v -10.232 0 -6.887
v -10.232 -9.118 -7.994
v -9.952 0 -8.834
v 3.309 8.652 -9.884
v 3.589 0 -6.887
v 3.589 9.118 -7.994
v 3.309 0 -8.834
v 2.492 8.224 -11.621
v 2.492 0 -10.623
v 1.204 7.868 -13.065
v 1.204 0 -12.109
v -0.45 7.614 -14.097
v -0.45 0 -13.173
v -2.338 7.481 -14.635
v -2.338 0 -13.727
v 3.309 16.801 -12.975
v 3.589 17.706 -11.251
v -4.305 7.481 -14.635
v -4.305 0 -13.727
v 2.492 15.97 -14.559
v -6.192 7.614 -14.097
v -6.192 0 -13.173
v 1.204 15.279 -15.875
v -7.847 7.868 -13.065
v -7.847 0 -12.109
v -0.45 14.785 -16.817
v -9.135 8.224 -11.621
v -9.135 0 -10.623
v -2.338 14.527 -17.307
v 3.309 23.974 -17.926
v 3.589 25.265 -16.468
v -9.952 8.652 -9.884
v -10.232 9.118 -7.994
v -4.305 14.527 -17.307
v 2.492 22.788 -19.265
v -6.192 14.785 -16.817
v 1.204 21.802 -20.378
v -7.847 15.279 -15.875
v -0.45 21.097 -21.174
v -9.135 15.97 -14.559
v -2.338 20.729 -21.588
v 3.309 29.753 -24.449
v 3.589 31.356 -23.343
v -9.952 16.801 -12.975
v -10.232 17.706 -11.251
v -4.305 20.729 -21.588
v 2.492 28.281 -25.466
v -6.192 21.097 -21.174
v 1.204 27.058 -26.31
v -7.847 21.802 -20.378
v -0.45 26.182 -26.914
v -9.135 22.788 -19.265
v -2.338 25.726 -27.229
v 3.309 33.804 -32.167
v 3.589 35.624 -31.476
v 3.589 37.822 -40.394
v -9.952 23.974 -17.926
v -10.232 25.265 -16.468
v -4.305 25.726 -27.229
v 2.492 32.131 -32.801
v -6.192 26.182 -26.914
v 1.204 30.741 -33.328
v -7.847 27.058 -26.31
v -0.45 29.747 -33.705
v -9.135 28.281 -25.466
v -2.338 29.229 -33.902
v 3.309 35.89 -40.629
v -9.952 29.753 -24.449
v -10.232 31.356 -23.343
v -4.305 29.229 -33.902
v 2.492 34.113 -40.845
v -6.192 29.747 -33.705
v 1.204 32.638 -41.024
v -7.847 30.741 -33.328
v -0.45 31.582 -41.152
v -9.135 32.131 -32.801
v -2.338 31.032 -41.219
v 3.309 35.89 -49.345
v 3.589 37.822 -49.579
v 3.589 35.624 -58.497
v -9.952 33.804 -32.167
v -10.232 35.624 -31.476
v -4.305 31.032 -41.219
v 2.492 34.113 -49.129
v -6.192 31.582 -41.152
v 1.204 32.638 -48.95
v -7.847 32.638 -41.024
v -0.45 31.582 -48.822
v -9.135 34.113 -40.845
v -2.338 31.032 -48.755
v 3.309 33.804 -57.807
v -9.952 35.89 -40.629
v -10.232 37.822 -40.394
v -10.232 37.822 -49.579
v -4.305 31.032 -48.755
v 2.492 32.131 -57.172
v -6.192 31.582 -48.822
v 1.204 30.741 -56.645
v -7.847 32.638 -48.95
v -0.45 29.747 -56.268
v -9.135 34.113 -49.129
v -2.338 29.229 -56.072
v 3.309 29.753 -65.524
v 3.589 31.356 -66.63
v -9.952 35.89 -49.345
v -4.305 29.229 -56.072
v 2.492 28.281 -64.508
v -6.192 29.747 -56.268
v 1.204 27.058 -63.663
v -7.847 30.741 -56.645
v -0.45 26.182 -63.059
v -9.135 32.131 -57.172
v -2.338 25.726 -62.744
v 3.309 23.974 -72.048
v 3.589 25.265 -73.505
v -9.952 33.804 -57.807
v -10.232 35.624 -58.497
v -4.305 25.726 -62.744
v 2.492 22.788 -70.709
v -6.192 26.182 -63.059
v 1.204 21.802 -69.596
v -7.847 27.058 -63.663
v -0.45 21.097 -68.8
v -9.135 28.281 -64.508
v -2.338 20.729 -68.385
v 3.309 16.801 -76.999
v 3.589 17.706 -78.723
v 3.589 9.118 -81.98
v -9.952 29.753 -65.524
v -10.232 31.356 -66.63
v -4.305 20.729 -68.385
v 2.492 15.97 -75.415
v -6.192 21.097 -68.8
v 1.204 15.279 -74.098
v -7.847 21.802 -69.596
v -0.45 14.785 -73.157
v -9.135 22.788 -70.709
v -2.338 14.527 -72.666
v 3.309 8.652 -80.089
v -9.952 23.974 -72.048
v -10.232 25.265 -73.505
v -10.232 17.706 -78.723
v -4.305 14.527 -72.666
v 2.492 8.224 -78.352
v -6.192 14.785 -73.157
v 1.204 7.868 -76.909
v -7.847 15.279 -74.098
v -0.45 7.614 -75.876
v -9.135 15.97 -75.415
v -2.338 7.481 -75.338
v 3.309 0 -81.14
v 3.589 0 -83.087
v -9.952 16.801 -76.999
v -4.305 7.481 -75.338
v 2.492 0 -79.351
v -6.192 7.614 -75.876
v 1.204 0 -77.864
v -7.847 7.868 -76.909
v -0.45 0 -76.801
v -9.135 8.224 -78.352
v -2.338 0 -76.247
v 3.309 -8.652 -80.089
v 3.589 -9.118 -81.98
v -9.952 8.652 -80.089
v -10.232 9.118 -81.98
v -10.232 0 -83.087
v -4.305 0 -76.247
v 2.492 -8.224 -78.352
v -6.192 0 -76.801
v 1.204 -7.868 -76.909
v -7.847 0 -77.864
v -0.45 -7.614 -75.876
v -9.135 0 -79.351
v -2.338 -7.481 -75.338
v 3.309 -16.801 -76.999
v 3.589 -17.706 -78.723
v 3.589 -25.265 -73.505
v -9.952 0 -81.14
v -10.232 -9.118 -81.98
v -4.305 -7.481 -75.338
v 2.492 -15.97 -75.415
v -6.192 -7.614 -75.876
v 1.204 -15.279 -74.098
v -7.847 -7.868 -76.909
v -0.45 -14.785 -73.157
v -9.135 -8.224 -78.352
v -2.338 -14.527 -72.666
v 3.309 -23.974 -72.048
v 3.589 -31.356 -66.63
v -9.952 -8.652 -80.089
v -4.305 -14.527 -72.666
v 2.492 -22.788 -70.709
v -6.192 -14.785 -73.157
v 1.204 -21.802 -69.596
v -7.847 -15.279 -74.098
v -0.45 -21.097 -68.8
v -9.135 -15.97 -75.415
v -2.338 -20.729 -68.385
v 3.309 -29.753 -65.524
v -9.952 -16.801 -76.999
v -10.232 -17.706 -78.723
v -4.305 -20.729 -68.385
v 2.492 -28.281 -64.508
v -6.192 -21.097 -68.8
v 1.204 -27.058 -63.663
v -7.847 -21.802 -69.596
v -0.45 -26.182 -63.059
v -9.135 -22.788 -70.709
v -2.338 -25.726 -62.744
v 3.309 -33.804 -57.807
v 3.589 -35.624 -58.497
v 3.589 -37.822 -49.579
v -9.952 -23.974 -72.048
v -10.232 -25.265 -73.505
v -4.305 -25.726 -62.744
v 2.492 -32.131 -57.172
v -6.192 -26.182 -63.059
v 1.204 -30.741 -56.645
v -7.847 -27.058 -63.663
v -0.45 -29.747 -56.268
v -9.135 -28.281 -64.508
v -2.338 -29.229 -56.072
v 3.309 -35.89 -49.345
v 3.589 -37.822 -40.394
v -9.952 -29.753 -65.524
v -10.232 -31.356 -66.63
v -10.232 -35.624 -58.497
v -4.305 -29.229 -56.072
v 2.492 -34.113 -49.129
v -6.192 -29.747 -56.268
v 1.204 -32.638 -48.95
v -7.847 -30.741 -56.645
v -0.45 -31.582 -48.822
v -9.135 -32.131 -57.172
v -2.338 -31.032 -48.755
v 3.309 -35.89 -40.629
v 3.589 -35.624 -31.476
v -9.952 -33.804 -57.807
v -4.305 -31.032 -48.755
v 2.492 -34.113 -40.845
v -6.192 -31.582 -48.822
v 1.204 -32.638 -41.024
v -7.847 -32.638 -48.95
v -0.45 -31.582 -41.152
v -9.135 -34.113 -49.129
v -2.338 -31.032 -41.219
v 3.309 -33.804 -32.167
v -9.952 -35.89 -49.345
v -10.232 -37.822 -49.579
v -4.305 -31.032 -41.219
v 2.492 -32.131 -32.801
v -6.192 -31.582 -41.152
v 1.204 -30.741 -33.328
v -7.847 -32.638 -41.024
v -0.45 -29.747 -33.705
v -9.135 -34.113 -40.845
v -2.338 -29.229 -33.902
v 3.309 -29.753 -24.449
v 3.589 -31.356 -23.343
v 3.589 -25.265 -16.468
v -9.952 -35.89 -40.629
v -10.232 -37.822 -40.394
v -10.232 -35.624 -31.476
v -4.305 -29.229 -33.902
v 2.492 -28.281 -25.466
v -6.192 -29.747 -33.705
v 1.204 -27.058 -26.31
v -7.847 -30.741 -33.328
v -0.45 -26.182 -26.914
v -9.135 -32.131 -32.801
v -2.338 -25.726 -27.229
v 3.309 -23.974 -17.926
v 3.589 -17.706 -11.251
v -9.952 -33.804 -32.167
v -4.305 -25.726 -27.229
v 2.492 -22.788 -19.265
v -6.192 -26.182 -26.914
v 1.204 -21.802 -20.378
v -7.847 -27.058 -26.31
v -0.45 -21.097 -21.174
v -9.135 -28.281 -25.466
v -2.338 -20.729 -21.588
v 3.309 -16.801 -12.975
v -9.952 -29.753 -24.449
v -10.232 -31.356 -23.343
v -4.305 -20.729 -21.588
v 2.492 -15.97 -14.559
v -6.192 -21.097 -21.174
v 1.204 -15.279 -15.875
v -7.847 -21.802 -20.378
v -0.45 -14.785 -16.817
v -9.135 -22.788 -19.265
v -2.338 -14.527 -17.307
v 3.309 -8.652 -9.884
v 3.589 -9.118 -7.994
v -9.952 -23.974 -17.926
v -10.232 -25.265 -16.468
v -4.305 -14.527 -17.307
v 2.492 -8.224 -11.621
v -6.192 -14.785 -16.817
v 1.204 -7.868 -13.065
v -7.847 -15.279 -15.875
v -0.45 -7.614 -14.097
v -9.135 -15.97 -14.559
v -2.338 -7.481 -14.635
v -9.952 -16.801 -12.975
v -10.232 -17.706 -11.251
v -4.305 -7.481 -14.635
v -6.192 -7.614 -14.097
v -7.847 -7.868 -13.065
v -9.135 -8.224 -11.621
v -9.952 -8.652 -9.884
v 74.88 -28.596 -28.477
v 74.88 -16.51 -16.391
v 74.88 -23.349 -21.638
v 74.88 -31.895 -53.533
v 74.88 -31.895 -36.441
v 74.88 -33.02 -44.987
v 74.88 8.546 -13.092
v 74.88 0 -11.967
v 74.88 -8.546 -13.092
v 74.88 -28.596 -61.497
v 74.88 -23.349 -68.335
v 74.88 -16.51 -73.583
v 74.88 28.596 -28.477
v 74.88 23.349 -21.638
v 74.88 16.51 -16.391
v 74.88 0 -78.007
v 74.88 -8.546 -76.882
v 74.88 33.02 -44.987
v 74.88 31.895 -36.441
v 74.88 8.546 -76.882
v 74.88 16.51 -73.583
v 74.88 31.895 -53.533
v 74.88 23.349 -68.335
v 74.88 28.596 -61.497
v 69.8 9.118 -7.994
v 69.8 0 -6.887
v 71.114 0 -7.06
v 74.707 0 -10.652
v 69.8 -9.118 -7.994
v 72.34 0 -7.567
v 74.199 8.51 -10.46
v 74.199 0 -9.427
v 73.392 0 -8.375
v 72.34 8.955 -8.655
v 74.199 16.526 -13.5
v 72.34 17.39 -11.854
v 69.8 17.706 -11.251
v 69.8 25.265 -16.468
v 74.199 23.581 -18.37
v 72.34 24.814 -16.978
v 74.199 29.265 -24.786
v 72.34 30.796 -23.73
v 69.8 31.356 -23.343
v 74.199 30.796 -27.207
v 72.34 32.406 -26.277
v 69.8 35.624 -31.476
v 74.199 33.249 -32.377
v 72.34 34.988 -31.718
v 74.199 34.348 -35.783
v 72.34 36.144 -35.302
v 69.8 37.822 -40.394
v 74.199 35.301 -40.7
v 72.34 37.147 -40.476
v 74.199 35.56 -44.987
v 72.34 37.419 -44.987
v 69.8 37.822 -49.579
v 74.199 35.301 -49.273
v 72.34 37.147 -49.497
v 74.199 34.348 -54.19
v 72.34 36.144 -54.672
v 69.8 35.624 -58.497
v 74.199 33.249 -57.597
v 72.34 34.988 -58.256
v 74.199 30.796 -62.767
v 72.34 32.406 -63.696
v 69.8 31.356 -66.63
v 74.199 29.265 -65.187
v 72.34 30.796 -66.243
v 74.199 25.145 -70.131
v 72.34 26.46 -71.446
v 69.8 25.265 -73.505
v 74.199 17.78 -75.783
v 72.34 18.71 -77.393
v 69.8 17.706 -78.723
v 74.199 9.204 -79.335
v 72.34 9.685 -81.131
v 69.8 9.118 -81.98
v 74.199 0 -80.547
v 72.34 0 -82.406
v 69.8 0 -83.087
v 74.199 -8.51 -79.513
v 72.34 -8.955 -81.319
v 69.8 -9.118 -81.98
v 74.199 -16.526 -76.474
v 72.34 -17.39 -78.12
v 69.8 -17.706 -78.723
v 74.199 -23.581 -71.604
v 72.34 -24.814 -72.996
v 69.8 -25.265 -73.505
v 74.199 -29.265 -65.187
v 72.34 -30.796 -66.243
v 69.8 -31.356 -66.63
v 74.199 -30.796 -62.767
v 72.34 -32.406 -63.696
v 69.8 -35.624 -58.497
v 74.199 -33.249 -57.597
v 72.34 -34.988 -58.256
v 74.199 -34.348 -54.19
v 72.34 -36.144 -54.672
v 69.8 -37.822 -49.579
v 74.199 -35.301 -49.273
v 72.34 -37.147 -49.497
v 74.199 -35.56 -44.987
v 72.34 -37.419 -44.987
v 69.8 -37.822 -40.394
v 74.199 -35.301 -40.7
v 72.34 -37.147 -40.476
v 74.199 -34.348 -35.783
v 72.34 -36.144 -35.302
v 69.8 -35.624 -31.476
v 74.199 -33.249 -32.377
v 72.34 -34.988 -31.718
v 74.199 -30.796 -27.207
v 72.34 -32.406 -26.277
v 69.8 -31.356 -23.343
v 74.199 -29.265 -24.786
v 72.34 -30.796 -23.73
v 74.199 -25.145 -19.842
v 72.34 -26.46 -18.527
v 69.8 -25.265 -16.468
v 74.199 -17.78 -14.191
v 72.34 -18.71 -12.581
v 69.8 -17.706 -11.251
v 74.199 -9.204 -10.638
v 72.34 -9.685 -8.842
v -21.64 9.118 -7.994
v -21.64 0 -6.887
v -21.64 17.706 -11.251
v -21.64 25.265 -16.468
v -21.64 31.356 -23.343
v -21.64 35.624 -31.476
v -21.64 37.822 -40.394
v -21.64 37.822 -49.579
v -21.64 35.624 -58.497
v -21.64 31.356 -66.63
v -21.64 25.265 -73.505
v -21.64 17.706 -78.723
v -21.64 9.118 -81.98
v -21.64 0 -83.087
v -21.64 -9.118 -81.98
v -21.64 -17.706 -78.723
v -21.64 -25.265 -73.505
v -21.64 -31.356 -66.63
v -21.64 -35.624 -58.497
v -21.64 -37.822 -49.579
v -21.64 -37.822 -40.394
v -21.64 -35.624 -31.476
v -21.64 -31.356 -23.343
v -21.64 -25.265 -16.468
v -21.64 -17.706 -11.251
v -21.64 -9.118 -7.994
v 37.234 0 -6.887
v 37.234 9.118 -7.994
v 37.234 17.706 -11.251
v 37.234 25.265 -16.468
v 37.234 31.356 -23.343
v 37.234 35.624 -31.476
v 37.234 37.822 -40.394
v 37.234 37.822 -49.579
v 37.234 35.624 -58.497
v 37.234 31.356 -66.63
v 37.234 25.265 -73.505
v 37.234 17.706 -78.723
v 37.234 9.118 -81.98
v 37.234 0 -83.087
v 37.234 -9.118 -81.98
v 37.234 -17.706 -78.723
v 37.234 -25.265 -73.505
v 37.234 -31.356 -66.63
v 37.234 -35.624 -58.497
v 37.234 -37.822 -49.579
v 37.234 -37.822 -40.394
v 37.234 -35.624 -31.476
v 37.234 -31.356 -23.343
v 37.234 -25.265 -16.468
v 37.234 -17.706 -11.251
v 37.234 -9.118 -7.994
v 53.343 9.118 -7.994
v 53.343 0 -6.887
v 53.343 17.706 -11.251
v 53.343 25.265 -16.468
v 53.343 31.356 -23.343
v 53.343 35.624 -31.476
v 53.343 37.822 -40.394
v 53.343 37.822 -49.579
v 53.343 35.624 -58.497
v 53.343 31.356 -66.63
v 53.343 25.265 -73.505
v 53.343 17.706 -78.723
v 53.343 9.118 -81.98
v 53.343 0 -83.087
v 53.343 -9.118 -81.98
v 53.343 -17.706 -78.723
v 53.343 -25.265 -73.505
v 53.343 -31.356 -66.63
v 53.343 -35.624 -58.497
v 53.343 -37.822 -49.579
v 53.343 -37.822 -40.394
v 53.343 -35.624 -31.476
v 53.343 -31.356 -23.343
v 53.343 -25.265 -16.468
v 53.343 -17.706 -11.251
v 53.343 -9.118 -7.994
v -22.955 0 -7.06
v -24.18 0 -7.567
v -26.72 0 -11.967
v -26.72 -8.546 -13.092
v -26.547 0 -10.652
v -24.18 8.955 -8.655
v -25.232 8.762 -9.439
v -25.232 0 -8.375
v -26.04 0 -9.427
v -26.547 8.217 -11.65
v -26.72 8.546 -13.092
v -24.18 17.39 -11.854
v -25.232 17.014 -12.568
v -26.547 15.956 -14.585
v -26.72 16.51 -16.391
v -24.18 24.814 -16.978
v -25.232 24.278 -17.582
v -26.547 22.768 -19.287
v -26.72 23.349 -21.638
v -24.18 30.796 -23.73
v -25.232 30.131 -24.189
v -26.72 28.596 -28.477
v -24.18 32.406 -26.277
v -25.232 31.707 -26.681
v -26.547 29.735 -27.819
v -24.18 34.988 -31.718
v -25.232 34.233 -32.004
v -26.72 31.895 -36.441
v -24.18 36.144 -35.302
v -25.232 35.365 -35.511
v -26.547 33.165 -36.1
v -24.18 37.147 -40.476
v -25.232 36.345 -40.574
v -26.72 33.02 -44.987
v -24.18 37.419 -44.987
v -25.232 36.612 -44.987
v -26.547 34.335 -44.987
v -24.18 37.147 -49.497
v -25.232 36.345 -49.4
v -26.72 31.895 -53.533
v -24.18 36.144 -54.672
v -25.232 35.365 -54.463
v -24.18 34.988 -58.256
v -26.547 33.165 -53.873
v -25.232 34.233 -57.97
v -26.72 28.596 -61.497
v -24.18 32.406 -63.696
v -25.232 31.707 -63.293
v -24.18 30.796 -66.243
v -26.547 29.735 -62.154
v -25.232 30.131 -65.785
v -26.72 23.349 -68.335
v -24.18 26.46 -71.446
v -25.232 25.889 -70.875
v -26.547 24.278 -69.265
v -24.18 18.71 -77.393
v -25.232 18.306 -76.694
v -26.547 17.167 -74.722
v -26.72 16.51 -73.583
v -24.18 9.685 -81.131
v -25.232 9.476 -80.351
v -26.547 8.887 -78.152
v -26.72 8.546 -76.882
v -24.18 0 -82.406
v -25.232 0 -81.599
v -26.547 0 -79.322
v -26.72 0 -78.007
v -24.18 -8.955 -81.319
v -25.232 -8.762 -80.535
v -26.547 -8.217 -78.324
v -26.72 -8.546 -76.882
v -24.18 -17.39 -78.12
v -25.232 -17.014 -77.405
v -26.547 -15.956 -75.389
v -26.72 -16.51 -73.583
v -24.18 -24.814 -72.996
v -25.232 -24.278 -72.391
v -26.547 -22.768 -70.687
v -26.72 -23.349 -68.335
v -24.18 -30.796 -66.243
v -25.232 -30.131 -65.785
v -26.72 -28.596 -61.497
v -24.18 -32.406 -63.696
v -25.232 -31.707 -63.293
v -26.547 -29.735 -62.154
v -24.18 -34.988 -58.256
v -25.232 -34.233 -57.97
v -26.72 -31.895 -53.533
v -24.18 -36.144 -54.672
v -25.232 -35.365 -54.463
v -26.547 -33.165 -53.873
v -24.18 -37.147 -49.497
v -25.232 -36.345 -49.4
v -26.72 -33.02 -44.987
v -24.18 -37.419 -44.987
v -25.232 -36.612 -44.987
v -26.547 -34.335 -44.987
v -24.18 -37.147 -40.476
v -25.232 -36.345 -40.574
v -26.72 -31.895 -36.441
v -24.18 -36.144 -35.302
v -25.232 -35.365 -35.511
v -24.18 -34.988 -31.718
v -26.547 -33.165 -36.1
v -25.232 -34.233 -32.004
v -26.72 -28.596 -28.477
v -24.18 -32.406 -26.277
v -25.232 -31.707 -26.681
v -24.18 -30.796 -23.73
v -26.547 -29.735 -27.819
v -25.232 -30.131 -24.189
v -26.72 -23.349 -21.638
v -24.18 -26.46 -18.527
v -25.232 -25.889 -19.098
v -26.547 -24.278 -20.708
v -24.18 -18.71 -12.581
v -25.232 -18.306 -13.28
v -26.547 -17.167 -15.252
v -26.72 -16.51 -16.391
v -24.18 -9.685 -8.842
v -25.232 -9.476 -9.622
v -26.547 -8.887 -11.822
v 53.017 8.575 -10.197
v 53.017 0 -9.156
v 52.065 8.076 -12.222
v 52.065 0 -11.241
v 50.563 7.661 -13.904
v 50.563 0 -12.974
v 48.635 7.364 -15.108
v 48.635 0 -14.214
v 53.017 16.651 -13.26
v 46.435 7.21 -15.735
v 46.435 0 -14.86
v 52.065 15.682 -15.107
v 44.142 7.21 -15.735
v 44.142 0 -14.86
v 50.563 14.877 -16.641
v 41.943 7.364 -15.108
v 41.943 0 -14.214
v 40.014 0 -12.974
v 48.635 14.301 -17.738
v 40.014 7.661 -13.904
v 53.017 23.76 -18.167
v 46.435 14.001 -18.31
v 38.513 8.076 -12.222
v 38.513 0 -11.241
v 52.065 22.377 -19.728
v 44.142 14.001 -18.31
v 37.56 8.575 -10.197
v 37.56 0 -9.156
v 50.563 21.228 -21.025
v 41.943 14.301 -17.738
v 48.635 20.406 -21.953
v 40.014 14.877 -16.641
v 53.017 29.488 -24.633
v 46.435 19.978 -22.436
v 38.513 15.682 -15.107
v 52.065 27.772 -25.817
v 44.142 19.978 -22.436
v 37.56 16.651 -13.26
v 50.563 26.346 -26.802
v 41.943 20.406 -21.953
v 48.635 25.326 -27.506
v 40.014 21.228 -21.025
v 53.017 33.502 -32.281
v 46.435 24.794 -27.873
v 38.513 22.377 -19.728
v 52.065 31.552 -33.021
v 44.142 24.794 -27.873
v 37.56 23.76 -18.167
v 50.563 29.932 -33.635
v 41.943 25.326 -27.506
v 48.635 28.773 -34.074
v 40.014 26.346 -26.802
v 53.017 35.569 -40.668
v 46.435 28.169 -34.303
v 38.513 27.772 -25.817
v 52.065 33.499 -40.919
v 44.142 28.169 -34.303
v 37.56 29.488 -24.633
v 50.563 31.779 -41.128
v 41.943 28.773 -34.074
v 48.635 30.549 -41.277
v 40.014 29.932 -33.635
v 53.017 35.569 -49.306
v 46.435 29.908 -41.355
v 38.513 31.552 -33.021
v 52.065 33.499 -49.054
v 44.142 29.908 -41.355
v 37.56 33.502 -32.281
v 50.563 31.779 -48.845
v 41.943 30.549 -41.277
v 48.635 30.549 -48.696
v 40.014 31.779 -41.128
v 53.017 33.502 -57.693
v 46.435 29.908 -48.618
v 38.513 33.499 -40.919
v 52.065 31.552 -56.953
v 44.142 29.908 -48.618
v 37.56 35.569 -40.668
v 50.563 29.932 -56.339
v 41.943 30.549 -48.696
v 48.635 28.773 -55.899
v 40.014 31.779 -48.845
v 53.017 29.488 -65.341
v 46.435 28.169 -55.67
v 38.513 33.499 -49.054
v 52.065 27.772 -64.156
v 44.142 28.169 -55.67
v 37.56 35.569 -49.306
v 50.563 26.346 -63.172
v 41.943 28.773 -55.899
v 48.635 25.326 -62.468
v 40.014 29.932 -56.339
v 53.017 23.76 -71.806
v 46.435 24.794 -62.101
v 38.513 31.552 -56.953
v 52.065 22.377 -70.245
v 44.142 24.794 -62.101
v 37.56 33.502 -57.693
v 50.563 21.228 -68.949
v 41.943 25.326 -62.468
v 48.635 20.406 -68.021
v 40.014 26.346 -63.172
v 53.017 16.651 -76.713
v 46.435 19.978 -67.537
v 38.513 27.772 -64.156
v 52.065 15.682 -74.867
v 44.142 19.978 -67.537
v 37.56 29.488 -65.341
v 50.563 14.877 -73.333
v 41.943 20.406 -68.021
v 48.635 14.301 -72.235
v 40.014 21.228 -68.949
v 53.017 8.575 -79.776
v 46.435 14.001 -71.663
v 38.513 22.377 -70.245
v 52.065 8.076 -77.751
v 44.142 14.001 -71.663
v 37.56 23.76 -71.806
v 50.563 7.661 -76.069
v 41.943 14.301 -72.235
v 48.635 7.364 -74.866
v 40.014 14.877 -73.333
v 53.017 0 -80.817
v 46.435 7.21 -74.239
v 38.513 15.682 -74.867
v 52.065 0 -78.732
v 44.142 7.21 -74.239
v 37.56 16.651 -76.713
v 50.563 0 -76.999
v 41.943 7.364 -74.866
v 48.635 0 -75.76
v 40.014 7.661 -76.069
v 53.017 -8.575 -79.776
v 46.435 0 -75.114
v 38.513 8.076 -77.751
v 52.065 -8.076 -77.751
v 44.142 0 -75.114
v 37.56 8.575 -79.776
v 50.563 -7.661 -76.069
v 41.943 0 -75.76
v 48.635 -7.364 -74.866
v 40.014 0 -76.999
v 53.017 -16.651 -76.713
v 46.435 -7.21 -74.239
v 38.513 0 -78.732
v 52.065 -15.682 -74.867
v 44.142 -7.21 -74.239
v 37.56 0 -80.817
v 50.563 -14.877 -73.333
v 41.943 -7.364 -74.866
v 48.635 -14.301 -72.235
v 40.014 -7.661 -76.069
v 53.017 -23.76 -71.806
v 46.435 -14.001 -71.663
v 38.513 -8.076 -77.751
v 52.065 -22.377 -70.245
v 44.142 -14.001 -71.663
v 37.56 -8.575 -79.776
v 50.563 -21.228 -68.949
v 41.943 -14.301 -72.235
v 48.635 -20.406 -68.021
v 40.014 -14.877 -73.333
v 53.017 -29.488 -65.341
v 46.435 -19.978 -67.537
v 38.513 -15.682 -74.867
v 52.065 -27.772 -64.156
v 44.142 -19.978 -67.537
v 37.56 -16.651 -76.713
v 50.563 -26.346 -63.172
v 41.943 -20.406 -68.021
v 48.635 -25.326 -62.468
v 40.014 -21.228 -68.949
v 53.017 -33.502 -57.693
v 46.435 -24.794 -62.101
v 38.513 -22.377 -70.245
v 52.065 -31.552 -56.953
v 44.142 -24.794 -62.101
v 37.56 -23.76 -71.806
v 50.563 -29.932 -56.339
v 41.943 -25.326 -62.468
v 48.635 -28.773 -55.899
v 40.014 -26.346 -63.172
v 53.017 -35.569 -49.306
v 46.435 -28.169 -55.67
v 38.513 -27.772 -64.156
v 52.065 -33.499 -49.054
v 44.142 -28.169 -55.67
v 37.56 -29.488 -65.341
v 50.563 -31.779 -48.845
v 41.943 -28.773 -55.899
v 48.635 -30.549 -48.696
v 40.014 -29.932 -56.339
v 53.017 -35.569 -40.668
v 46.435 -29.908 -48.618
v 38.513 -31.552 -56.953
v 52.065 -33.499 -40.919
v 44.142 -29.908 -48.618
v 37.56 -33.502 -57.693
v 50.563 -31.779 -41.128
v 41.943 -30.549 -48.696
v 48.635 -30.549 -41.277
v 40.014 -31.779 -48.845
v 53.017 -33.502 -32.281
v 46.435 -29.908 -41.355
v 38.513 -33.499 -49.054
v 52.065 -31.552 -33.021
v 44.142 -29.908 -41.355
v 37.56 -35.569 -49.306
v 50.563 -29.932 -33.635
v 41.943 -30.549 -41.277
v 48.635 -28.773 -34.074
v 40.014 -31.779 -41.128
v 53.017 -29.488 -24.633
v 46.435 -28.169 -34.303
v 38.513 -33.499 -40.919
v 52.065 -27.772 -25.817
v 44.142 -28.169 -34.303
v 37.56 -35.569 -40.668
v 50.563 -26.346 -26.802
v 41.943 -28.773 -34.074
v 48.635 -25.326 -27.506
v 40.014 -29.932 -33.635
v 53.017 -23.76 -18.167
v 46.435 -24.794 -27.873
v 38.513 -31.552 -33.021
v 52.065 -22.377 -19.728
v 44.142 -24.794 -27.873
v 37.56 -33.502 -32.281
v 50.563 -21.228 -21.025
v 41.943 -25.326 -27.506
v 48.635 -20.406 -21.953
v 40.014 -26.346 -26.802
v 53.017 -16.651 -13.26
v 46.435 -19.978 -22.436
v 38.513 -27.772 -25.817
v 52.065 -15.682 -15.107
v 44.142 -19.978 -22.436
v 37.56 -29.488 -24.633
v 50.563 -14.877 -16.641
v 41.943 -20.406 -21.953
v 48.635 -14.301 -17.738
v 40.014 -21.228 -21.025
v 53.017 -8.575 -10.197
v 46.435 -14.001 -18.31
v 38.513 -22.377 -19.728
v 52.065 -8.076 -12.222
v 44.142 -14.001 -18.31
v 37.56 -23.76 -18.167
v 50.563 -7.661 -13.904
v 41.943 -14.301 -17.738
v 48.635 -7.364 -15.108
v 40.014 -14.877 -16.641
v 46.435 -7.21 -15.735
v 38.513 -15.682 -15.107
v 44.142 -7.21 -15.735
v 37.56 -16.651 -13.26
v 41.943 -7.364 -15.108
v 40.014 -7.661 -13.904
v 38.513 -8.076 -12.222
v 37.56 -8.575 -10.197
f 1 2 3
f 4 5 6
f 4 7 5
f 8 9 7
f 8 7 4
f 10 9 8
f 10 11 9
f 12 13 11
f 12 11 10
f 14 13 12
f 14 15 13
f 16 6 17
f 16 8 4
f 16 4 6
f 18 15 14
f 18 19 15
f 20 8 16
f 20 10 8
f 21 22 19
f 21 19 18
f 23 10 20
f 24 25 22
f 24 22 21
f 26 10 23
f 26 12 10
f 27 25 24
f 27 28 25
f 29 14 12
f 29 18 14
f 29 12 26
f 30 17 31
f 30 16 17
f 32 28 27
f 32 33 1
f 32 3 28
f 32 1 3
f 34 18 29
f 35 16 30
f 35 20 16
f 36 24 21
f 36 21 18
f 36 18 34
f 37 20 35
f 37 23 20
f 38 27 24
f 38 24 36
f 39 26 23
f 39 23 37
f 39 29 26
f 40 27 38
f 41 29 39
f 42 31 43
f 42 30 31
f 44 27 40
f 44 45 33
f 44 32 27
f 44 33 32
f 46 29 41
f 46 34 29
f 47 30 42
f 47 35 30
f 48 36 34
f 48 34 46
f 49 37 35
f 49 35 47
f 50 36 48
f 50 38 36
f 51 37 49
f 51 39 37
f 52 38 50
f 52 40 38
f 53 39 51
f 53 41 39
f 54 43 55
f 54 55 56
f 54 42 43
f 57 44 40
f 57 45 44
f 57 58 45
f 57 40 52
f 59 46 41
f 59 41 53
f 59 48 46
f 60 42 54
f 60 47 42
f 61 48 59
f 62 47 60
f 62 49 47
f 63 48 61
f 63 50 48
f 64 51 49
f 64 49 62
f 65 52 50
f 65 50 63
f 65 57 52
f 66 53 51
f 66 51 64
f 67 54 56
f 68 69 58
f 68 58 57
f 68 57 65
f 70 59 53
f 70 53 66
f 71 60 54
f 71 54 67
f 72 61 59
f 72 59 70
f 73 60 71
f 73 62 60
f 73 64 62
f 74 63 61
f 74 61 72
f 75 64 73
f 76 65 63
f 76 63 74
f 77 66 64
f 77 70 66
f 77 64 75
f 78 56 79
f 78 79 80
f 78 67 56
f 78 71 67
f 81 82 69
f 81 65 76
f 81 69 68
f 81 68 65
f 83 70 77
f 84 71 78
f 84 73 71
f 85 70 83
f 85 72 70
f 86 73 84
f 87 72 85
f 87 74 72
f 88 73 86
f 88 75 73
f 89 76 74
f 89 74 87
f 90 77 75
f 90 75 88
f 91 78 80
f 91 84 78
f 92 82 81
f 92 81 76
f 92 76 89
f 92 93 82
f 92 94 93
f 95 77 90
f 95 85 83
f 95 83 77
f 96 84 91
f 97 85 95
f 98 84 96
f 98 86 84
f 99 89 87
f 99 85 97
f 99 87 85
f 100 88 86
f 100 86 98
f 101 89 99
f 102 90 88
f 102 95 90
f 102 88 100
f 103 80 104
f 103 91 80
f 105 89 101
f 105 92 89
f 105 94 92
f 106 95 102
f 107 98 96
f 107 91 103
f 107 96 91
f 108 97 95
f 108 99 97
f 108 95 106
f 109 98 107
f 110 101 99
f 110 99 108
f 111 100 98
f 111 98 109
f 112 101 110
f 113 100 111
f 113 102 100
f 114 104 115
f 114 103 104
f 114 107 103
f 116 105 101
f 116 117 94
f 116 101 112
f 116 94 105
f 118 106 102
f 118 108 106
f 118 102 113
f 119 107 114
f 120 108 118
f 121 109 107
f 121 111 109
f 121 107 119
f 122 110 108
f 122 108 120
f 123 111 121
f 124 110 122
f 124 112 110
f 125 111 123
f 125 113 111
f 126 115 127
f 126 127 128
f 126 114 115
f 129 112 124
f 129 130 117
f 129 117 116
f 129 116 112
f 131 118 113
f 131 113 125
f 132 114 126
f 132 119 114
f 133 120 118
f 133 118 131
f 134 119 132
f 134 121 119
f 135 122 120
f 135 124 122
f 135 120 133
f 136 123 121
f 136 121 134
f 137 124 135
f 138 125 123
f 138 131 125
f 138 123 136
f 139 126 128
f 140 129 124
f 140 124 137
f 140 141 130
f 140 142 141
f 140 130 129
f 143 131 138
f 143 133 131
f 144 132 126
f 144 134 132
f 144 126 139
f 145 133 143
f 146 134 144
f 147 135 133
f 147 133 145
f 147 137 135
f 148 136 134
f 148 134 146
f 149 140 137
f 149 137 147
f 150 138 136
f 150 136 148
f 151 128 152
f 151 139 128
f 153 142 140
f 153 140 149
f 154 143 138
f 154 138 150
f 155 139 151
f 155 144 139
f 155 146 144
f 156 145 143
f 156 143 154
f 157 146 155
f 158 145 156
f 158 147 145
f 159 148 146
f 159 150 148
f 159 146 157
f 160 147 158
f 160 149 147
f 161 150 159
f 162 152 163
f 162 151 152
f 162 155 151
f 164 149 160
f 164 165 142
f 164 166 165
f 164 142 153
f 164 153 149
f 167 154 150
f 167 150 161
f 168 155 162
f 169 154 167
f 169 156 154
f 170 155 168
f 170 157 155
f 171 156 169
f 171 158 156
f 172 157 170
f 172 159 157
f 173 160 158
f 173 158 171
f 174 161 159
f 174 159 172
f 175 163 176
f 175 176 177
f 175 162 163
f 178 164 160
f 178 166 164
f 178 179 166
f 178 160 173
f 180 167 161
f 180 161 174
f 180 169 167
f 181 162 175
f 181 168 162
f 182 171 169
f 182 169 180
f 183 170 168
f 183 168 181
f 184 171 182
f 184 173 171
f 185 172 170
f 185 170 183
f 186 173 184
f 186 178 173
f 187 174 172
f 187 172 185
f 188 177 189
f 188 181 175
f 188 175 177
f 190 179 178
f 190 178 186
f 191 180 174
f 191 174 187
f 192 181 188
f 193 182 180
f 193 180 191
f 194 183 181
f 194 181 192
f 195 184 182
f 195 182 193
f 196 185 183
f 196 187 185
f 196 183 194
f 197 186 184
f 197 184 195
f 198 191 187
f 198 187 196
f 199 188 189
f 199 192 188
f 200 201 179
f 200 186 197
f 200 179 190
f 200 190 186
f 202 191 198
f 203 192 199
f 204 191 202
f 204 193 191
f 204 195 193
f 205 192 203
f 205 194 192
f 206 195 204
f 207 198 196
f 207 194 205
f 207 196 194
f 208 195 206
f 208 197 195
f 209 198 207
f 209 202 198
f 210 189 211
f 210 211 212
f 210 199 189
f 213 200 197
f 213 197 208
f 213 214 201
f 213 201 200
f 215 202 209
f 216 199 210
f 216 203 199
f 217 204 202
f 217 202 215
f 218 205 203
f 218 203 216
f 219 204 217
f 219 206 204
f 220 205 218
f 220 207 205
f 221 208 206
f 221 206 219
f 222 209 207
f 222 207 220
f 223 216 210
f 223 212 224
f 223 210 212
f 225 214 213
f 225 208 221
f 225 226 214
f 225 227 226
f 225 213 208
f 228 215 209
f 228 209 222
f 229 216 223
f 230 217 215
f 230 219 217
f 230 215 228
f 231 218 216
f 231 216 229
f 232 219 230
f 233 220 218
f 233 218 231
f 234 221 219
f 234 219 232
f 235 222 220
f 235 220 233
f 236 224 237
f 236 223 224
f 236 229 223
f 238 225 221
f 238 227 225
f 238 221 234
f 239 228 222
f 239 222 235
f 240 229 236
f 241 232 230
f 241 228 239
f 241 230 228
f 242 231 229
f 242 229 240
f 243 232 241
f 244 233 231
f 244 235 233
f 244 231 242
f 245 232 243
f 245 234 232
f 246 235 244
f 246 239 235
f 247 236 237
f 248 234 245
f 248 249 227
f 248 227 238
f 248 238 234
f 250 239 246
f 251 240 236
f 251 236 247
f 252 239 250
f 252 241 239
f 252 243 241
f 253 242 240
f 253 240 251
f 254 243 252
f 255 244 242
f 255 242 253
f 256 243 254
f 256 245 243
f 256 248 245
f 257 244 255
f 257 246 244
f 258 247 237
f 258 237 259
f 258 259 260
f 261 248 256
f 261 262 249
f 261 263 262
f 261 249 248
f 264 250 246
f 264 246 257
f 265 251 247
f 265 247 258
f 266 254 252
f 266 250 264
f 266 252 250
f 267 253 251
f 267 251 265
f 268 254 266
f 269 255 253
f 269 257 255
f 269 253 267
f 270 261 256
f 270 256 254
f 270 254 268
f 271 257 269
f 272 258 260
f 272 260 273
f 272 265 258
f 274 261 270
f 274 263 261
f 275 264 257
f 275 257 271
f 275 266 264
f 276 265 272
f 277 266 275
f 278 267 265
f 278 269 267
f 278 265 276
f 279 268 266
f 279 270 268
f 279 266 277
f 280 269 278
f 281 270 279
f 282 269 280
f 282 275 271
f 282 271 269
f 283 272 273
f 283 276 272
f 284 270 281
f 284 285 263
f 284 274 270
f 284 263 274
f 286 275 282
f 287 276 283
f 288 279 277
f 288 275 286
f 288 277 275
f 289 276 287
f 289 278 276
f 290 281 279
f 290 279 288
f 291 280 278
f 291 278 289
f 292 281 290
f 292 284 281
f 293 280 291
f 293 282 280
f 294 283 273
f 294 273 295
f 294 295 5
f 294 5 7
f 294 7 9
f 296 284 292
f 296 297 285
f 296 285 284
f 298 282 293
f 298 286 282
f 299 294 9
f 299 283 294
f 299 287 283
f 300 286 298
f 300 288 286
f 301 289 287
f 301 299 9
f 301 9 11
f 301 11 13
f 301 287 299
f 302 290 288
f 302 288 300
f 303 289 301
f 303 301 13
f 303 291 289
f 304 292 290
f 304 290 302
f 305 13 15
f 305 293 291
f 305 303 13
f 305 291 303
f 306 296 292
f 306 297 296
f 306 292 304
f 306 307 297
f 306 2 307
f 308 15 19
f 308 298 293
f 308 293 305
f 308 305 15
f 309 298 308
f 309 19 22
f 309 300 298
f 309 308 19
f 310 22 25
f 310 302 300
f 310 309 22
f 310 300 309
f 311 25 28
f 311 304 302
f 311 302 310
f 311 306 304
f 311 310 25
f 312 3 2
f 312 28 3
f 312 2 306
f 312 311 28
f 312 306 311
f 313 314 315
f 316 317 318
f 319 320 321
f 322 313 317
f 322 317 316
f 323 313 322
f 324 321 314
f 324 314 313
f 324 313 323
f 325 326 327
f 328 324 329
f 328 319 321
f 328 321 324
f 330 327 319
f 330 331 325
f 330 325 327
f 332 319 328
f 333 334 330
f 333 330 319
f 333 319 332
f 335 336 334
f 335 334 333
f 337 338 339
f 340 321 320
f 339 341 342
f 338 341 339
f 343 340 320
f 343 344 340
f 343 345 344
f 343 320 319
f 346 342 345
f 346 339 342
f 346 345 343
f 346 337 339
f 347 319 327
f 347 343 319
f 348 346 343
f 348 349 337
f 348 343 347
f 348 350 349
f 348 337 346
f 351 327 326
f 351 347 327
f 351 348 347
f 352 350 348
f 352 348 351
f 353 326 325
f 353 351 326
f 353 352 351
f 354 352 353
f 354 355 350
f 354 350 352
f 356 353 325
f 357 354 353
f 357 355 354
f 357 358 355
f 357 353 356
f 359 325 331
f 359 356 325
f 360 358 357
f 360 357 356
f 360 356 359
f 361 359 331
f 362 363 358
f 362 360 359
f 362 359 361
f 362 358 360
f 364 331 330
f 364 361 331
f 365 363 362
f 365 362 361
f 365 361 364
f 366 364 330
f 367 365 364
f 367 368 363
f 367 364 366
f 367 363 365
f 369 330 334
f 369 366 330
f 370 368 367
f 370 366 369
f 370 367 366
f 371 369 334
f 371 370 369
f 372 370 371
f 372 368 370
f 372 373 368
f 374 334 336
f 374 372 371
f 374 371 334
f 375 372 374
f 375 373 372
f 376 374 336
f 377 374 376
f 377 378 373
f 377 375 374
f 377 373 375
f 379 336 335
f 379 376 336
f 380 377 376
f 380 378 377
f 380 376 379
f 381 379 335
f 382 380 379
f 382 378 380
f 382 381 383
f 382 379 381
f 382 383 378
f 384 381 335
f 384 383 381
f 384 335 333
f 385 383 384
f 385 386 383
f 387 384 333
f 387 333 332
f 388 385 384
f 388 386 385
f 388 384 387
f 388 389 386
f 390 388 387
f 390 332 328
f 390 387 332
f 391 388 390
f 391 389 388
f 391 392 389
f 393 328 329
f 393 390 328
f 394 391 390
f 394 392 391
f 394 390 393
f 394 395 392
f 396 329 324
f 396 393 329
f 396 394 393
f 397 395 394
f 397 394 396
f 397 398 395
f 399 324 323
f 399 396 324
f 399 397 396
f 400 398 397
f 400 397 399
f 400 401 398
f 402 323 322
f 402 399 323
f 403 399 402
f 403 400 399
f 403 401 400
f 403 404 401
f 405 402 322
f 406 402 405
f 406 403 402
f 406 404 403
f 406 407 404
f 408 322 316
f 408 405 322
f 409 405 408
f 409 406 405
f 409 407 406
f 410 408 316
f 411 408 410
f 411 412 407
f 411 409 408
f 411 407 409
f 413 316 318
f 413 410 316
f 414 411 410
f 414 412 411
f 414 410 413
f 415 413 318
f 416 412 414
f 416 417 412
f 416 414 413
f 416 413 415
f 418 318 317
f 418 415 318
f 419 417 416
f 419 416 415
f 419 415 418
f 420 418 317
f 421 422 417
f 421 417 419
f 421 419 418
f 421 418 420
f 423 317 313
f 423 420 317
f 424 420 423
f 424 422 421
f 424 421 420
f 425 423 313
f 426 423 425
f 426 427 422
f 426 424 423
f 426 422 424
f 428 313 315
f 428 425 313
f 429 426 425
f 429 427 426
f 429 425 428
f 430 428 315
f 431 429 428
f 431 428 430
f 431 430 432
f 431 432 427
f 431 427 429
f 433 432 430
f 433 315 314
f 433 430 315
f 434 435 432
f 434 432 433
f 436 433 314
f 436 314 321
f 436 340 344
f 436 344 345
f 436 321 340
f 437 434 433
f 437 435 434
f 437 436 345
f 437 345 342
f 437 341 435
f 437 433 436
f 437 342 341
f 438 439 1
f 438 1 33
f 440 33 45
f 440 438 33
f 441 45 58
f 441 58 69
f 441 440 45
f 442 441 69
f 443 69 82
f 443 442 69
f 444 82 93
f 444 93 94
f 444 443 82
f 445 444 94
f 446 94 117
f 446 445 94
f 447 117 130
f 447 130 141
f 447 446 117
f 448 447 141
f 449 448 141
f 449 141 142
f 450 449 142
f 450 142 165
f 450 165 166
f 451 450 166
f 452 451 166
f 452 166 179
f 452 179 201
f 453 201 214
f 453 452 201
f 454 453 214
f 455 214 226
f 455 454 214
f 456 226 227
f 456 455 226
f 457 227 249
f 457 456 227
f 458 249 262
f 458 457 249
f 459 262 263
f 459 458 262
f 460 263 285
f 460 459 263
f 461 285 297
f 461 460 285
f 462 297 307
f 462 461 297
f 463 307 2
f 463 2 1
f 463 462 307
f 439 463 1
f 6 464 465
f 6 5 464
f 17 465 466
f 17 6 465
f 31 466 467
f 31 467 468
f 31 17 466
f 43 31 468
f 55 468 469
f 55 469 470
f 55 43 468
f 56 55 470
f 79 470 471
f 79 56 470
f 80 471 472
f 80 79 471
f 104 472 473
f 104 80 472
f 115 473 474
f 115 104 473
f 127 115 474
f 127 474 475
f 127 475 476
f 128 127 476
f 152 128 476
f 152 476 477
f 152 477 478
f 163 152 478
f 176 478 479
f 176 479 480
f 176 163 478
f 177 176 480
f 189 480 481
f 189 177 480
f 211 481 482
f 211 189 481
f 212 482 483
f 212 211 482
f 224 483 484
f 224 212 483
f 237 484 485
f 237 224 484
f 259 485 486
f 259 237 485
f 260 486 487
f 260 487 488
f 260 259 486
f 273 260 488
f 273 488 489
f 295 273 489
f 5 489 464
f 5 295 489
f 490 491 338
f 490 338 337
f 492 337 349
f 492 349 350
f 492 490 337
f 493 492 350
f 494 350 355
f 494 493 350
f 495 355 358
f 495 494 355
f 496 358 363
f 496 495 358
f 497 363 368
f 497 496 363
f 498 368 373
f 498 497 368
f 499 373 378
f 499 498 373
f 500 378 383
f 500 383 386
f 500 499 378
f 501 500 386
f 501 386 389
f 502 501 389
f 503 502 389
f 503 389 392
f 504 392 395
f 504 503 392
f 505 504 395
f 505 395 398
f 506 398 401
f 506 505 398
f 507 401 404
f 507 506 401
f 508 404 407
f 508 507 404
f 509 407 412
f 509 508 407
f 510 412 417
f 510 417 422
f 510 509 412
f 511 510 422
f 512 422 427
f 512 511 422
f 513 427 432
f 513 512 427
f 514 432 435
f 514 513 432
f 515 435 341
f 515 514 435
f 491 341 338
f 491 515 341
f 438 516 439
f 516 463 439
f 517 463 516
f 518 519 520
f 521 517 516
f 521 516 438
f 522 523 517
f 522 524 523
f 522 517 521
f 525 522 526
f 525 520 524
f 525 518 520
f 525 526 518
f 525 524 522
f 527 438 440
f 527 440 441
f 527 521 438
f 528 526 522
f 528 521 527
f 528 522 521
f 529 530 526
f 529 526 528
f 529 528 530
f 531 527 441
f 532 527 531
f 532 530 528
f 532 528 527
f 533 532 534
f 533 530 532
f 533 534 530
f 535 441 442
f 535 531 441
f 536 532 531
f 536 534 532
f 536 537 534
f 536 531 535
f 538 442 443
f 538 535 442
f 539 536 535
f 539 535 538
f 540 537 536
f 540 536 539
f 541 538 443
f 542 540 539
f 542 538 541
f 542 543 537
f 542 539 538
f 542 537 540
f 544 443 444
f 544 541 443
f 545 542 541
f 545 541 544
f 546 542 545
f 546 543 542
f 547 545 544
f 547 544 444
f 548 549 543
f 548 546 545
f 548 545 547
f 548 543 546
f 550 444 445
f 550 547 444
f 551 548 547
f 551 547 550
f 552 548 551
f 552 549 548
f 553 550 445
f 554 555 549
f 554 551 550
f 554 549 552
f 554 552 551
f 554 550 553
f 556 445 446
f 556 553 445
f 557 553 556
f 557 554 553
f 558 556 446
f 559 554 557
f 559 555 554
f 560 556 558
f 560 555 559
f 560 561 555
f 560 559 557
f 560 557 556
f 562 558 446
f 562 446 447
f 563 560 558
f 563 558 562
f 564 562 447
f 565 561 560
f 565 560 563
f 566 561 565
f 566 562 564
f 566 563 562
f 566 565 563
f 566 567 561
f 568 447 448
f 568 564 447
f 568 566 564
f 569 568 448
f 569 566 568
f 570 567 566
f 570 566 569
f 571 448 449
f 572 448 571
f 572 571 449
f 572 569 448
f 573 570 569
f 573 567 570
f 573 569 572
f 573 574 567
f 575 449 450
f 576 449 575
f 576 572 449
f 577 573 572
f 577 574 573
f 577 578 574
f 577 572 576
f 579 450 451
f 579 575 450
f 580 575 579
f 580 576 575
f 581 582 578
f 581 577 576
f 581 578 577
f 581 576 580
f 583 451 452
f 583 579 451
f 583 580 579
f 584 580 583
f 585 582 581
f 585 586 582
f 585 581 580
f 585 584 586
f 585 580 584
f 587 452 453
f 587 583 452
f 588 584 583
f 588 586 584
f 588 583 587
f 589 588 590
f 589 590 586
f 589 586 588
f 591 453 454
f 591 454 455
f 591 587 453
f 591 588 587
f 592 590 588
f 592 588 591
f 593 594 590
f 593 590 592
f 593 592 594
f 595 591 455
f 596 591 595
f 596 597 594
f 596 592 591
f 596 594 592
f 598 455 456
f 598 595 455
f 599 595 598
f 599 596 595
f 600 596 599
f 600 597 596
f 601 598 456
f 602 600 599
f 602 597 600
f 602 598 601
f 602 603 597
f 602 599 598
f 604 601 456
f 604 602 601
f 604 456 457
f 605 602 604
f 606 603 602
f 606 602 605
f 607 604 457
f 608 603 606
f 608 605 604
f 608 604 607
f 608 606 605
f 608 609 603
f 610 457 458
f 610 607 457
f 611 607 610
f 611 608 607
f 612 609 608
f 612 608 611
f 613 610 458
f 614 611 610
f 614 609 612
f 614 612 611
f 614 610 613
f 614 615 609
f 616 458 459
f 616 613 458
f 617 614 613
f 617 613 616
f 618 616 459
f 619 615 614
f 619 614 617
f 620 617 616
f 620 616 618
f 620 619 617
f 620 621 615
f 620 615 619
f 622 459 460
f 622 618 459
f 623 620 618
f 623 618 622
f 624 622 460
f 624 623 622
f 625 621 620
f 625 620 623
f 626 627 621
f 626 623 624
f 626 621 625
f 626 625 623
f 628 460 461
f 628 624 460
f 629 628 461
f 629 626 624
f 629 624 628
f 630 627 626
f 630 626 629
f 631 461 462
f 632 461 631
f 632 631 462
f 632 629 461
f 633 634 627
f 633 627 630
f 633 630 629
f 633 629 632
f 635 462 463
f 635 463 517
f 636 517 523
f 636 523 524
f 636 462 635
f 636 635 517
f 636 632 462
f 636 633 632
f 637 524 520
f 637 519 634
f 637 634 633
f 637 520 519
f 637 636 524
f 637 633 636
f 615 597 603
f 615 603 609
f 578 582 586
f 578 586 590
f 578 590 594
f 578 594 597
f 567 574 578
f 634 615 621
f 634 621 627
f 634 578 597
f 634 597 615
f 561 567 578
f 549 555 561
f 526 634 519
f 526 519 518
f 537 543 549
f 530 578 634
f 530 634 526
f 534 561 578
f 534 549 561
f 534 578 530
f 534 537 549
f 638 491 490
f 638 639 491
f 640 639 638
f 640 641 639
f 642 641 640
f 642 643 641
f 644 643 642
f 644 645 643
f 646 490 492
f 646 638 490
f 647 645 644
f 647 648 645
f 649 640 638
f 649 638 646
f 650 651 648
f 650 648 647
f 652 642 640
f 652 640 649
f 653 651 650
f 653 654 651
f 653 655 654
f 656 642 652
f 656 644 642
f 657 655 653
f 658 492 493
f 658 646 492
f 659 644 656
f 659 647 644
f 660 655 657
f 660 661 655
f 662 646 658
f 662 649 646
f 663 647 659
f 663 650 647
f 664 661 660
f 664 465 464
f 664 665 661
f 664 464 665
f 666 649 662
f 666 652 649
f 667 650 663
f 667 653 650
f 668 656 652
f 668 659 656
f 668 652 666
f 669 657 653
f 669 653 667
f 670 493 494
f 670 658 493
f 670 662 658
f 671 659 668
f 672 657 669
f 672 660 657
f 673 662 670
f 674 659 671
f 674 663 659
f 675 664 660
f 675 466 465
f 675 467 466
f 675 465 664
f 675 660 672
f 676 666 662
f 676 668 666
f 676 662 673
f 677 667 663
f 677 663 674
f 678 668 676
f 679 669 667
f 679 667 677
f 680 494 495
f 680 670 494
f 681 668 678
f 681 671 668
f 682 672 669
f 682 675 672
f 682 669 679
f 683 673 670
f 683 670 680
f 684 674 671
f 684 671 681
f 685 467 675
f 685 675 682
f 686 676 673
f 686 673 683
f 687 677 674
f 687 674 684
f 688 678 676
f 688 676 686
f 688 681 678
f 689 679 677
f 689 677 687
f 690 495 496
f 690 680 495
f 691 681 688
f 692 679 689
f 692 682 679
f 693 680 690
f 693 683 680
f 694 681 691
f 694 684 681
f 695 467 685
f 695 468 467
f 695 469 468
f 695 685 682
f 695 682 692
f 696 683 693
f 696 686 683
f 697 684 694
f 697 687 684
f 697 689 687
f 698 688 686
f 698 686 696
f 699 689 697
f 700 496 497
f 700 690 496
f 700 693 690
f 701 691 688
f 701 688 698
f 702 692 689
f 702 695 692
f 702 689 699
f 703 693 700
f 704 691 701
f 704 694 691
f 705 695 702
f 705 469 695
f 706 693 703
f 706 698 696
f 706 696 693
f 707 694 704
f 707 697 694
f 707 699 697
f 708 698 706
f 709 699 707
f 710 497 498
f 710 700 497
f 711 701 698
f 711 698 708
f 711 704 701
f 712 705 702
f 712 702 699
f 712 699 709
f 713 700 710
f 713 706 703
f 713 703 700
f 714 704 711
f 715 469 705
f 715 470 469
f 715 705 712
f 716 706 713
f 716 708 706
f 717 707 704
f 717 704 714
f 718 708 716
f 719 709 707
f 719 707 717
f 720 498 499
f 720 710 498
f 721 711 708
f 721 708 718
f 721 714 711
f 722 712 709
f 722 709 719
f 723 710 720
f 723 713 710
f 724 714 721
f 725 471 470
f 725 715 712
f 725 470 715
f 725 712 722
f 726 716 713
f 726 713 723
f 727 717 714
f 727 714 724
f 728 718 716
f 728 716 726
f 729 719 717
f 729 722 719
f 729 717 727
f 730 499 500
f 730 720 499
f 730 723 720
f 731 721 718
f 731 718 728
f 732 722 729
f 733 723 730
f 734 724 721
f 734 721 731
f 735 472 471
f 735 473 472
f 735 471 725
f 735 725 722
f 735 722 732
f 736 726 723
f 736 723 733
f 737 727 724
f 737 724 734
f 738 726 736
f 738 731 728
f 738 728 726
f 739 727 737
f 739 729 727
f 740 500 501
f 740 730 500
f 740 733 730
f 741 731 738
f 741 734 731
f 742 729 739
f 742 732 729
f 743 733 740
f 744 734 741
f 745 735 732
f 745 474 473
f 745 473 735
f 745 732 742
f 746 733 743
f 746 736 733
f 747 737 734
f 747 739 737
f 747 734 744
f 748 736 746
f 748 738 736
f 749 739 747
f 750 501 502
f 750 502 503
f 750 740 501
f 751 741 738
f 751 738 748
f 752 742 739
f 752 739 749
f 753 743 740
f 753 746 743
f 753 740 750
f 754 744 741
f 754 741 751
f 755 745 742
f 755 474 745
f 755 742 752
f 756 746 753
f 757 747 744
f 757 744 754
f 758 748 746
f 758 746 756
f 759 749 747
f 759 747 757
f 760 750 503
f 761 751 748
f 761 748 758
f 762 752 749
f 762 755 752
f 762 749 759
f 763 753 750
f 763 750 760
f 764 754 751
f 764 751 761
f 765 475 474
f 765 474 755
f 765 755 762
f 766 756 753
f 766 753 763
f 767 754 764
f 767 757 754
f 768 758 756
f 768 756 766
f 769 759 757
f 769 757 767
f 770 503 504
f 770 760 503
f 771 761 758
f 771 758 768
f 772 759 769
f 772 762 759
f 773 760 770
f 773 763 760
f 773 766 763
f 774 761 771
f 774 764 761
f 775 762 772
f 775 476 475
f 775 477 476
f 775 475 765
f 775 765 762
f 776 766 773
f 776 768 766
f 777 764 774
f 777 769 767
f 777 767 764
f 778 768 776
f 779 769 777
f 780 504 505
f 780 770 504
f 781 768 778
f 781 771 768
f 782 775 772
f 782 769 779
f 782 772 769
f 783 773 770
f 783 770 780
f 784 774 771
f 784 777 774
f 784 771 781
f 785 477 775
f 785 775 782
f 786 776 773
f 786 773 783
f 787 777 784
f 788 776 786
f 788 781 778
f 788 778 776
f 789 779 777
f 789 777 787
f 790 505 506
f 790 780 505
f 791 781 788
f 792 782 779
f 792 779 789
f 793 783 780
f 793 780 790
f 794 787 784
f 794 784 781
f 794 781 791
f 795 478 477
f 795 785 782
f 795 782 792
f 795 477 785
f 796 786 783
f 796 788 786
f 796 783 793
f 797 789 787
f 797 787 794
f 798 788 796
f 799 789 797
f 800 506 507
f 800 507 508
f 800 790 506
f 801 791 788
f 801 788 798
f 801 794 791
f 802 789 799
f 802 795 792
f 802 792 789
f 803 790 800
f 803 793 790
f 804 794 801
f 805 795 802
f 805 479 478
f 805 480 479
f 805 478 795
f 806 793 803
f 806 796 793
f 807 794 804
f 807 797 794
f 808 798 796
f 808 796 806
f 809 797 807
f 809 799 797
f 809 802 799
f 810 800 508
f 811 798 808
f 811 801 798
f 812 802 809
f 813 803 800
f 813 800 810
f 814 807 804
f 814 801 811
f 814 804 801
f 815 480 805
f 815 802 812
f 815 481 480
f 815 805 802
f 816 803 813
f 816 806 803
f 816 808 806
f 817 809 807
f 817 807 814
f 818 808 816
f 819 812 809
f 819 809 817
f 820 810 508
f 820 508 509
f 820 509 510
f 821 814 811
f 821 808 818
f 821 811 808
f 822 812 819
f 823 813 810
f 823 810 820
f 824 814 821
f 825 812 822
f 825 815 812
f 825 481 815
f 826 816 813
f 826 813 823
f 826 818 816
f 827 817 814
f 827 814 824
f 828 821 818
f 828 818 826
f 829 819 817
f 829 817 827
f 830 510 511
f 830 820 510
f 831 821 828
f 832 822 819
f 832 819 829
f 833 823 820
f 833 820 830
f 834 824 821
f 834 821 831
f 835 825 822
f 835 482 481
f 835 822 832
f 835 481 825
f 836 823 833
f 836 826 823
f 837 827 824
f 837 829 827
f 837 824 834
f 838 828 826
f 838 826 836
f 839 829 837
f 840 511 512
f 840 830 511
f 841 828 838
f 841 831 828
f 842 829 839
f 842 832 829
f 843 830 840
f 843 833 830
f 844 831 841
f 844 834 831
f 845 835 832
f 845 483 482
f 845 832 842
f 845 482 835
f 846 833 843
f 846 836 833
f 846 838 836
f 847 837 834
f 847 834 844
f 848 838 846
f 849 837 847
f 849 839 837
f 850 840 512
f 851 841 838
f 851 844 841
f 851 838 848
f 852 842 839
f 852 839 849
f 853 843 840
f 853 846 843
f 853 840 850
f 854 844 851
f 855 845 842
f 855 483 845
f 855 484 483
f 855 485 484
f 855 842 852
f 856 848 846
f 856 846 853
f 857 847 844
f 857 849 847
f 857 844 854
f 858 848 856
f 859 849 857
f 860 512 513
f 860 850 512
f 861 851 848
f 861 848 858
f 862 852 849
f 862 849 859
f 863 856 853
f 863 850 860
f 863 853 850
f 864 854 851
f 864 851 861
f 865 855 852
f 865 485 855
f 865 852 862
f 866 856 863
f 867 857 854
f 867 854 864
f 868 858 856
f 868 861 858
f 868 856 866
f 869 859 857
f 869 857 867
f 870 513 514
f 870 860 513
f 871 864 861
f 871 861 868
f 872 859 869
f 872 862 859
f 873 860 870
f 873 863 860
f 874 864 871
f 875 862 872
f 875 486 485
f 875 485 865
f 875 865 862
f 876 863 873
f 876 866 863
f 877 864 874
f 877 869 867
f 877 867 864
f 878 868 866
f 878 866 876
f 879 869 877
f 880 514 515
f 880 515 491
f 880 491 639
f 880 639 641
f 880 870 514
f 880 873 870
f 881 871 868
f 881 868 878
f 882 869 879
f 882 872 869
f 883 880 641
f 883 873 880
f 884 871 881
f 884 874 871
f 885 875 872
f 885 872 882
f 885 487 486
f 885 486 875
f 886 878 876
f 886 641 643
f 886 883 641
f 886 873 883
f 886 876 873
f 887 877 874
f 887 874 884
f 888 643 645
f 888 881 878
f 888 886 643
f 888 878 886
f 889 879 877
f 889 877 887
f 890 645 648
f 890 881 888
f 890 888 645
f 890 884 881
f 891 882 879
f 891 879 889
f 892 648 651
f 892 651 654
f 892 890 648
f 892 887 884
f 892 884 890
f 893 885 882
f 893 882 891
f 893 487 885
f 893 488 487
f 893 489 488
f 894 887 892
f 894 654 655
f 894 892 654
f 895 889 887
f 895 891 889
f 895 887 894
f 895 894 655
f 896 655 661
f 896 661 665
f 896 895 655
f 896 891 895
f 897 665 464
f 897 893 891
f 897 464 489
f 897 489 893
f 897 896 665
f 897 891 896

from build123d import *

# Parameters (mm, degrees)
F2_R = 5.08


with BuildPart() as f1:
    # F0 (on Front) → F1 (revolve)
    with BuildSketch(Plane.XZ):
        with BuildLine():
            Line((74.8796791941, -44.9867546558), (74.8796791941, -6.8867546558))
            Line((74.8796791941, -6.8867546558), (53.3434134441, -6.8867546558))
            ThreePointArc((53.3434134441, -6.8867546558), (45.2886782587, -14.9414898413), (37.2339430732, -6.8867546558))
            Line((37.2339430732, -6.8867546558), (3.5892582275, -6.8867546558))
            ThreePointArc((3.5892582275, -6.8867546558), (-3.3211708069, -13.7971836903), (-10.2315998413, -6.8867546558))
            Line((-10.2315998413, -6.8867546558), (-26.7203208059, -6.8867546558))
            Line((-26.7203208059, -6.8867546558), (-26.7203208059, -44.9867546558))
            Line((-26.7203208059, -44.9867546558), (74.8796791941, -44.9867546558))
        make_face()
    revolve(axis=Axis((24.0796791941, 0, -44.9867546558), (-1, 0, 0)))

    # F2
    f2_edges = [f1.edges().sort_by_distance(p)[0] for p in [
        (-26.720321, 0, -83.086755),
        (74.879679, 0, -83.086755),
    ]]
    fillet(f2_edges, radius=F2_R)


solid = f1.part
